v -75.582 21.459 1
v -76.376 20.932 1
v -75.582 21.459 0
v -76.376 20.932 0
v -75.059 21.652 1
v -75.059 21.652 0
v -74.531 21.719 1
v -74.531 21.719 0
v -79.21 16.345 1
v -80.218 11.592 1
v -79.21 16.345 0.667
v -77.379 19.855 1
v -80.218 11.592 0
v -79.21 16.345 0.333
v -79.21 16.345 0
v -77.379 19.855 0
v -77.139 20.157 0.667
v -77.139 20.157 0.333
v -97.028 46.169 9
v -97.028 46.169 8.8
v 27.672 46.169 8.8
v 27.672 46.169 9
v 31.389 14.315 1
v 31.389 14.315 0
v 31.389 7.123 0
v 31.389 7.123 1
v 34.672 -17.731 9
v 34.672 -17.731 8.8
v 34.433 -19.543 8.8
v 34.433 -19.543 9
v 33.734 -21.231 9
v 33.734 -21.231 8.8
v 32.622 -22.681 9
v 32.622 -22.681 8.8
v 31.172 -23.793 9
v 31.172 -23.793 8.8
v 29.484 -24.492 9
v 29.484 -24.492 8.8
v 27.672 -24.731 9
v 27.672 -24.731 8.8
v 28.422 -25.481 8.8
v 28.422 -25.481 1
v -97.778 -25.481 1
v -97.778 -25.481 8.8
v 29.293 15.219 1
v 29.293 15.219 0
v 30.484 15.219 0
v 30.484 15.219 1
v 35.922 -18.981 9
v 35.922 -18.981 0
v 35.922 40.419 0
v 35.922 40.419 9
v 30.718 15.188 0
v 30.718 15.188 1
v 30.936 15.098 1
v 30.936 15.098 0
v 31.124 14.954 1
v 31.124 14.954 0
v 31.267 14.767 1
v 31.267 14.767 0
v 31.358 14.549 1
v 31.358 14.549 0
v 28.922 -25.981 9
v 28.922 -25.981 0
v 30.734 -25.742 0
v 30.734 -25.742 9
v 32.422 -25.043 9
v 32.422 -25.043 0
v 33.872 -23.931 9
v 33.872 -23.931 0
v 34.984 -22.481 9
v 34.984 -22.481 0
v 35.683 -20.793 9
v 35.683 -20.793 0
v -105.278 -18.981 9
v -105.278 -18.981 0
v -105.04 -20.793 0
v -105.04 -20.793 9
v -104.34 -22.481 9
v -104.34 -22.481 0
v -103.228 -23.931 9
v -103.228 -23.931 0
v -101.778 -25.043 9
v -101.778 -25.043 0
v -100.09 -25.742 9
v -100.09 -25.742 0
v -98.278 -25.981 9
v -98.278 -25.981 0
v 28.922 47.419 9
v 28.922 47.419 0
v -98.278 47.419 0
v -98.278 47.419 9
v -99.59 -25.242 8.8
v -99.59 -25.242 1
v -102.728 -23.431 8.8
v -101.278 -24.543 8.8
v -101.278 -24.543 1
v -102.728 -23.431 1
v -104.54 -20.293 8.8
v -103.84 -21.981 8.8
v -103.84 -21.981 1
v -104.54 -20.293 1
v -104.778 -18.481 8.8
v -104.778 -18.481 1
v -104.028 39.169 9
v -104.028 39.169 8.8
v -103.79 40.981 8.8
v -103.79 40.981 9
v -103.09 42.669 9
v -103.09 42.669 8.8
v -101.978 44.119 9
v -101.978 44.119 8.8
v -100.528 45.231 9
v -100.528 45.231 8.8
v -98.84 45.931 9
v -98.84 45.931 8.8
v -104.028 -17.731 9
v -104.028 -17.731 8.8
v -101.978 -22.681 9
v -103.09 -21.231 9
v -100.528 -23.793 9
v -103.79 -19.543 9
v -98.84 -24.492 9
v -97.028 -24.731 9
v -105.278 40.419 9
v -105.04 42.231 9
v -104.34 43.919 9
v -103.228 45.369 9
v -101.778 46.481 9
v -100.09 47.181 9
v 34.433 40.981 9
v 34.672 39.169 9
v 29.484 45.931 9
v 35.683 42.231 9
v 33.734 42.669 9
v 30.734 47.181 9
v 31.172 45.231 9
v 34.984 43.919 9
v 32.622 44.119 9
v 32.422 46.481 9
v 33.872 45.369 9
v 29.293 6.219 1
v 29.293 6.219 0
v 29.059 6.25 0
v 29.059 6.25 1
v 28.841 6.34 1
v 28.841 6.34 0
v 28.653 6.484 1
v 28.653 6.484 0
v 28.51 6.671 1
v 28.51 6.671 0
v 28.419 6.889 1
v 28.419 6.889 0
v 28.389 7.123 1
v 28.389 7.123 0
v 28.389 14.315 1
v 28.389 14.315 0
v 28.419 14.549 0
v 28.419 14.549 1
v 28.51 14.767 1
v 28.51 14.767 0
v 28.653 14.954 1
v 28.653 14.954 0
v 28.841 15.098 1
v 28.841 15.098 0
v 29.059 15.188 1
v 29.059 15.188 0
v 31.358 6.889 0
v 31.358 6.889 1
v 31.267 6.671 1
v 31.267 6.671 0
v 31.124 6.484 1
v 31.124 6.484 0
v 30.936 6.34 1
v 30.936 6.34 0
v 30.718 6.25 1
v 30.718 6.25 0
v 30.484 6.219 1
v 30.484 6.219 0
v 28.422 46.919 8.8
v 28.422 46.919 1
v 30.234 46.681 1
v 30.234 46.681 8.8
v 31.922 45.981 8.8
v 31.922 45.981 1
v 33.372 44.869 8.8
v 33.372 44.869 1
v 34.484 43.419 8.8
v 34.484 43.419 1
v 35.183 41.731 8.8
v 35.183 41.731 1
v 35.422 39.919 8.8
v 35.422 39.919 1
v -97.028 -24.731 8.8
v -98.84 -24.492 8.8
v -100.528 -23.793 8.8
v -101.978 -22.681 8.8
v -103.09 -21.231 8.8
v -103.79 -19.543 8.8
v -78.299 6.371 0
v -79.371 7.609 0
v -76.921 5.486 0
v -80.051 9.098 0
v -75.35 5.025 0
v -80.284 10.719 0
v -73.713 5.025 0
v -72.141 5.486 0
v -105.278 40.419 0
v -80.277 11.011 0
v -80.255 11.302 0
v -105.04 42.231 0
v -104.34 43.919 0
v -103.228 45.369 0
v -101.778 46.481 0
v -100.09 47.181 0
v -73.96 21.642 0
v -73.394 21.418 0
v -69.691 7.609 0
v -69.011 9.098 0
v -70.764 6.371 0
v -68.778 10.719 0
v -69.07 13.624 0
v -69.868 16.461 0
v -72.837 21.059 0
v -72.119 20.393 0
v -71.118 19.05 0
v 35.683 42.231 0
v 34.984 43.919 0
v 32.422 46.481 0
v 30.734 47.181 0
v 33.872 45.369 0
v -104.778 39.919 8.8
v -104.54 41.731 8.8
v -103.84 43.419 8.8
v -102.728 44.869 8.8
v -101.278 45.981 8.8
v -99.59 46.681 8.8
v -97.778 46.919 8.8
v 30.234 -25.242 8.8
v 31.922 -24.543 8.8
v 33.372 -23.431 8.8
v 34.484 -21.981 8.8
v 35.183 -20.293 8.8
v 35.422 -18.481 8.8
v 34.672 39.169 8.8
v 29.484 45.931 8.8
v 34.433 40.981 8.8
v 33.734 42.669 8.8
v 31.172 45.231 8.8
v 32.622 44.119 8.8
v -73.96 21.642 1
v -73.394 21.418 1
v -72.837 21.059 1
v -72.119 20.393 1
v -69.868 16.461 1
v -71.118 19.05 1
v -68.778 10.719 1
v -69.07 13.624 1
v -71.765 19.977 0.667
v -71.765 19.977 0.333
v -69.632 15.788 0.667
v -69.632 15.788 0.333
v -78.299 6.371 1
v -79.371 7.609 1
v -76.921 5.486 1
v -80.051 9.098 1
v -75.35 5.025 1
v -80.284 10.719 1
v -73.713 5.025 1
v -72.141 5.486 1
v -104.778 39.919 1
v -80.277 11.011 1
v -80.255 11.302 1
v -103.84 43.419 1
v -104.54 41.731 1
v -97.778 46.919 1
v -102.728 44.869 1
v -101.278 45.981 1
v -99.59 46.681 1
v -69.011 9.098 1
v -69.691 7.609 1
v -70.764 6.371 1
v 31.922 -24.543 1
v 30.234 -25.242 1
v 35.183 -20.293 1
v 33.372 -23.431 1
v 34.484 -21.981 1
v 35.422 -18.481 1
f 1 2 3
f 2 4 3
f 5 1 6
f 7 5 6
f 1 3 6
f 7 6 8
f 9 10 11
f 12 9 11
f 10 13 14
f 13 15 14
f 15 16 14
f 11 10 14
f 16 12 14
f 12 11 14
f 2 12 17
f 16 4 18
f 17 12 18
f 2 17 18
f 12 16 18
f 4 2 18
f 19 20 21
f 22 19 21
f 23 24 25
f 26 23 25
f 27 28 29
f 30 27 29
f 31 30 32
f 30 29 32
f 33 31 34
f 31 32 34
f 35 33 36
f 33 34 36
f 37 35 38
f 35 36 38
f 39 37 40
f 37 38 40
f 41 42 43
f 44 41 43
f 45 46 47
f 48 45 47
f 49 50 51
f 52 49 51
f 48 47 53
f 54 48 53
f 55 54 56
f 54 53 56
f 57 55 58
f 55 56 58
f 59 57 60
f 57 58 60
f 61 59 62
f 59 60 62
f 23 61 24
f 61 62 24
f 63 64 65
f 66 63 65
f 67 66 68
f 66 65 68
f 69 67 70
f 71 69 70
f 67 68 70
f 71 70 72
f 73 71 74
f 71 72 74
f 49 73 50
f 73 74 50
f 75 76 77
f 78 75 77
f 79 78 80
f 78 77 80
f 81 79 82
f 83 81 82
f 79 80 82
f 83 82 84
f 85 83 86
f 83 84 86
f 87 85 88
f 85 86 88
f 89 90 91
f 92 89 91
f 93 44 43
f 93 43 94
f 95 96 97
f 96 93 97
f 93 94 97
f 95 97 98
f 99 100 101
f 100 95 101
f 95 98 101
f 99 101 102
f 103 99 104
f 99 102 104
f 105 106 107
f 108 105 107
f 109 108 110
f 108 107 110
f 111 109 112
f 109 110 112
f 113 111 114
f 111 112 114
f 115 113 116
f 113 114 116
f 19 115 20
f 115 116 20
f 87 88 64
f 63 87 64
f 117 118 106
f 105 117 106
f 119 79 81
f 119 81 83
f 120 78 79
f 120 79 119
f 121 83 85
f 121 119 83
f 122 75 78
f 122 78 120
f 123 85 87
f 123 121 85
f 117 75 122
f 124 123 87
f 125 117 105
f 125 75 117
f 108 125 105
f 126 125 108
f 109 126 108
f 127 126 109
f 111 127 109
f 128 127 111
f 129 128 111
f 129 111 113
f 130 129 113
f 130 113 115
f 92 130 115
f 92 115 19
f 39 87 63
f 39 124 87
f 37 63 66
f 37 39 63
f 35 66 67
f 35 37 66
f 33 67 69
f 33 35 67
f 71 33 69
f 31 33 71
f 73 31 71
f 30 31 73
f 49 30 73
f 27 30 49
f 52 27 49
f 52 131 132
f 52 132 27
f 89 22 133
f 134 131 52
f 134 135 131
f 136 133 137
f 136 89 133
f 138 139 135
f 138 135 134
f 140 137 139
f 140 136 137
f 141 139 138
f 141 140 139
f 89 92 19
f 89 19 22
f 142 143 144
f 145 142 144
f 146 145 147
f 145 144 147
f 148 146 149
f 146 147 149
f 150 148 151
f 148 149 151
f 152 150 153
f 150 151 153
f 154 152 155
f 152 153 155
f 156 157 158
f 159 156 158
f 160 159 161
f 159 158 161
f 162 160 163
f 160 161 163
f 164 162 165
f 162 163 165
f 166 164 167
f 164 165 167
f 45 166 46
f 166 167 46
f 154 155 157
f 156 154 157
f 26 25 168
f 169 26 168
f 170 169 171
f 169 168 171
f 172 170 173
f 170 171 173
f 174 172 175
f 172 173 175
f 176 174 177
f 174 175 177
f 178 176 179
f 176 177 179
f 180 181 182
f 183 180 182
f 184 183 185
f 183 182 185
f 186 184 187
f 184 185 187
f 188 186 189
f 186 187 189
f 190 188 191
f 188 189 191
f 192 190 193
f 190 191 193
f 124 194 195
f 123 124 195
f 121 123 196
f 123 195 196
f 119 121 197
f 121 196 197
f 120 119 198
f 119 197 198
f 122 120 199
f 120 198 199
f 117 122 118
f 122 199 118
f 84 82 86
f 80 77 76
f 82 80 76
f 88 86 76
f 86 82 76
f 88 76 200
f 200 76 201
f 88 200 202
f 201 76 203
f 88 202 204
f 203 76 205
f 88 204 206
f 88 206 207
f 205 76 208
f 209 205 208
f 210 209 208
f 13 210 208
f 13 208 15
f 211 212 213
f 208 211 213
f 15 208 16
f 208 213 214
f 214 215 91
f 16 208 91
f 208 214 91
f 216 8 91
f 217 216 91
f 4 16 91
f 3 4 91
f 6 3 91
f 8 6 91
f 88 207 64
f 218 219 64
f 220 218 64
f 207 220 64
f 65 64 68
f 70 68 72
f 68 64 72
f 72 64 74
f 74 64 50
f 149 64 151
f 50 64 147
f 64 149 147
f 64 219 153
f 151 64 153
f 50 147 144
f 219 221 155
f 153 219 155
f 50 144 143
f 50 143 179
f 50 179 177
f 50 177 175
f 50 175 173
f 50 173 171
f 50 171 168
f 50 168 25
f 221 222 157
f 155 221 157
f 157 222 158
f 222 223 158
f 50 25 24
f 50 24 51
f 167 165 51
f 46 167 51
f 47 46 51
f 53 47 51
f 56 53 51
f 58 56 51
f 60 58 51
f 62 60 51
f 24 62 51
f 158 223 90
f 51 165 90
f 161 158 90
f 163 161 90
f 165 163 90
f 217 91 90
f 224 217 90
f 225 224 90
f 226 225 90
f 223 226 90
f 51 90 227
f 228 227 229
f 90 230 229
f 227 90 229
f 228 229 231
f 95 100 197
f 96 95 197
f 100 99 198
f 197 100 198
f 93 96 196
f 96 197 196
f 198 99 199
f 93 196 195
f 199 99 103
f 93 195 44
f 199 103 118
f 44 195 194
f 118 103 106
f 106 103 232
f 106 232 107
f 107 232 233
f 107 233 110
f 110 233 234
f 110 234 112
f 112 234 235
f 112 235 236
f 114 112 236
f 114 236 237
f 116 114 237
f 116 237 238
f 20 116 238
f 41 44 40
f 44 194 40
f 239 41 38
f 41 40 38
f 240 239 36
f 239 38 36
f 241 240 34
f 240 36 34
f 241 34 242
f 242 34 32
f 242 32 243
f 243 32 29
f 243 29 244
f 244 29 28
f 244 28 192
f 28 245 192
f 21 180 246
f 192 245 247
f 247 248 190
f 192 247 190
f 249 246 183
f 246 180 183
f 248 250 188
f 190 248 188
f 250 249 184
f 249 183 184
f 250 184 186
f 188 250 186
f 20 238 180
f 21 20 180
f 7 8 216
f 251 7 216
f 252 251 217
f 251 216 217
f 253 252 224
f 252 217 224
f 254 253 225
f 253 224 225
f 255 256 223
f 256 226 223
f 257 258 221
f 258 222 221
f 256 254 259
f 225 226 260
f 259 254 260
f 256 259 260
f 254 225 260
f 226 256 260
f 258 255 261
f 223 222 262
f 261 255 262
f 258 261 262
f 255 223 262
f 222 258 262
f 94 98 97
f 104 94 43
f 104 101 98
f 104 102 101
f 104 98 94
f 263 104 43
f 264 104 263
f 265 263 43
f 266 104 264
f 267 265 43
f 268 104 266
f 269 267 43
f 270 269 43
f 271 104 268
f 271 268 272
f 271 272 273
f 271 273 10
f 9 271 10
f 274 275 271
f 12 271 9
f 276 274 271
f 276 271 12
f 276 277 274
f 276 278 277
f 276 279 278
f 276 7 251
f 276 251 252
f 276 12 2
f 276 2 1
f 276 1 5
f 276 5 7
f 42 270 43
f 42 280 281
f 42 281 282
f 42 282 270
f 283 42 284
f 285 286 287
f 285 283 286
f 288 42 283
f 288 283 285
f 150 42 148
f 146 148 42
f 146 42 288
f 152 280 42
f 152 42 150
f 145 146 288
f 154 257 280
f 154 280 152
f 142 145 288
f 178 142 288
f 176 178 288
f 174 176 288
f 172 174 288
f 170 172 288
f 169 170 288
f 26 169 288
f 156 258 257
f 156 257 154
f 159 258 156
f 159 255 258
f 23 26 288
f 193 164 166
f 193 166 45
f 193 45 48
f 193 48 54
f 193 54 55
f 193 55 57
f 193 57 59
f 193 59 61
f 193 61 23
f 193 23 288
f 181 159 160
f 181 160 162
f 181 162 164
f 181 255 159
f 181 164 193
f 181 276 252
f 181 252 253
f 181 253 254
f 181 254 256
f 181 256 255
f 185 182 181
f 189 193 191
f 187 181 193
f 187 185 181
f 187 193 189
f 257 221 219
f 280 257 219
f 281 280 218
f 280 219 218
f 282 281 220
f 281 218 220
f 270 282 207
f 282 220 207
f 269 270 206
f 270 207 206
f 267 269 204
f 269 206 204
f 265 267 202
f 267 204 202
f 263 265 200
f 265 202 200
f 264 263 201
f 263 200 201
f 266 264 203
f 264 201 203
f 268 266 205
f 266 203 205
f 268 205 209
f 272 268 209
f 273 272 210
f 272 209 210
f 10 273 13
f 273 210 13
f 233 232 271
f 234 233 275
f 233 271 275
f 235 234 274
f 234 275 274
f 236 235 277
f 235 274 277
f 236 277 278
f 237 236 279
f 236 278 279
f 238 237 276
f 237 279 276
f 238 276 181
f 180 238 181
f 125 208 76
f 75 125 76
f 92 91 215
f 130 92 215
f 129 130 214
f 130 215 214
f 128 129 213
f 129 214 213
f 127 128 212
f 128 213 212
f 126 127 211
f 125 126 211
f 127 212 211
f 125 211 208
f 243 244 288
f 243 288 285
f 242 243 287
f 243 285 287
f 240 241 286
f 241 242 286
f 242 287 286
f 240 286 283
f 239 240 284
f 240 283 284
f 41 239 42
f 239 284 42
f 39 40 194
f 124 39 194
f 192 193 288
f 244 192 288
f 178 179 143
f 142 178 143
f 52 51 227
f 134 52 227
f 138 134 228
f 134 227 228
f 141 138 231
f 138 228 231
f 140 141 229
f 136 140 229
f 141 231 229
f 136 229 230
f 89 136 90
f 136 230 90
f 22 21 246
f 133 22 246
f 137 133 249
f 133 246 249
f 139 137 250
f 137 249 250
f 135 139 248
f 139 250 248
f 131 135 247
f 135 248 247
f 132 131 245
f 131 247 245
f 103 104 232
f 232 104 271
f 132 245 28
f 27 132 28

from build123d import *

# Parameters (mm, degrees)
F1_DEPTH = 9
F2_DEPTH = 1
F3_START = 8.8
F3_DEPTH = 0.2


with BuildPart() as f1:
    # F0 (on Top) → F1 (new body)
    with BuildSketch(Plane.XY):
        with BuildLine():
            Line((28.9218353152, 47.4191074908), (-98.2781646848, 47.4191074908))
            ThreePointArc((-98.2781646848, 47.4191074908), (-103.2279121531, 45.3688549591), (-105.2781646848, 40.4191074908))
            Line((-105.2781646848, 40.4191074908), (-105.2781646848, -18.9808925092))
            ThreePointArc((-105.2781646848, -18.9808925092), (-103.2279121531, -23.9306399775), (-98.2781646848, -25.9808925092))
            Line((-98.2781646848, -25.9808925092), (28.9218353152, -25.9808925092))
            ThreePointArc((28.9218353152, -25.9808925092), (33.8715827835, -23.9306399775), (35.9218353152, -18.9808925092))
            Line((35.9218353152, -18.9808925092), (35.9218353152, 40.4191074908))
            ThreePointArc((35.9218353152, 40.4191074908), (33.8715827835, 45.3688549591), (28.9218353152, 47.4191074908))
        make_face()
        with BuildLine():
            ThreePointArc((-104.7781646848, 39.9191074908), (-102.7279121531, 44.8688549591), (-97.7781646848, 46.9191074908))
            Line((-97.7781646848, 46.9191074908), (28.4218353152, 46.9191074908))
            ThreePointArc((28.4218353152, 46.9191074908), (33.3715827835, 44.8688549591), (35.4218353152, 39.9191074908))
            Line((35.4218353152, 39.9191074908), (35.4218353152, -18.4808925092))
            ThreePointArc((35.4218353152, -18.4808925092), (33.3715827835, -23.4306399775), (28.4218353152, -25.4808925092))
            Line((28.4218353152, -25.4808925092), (-97.7781646848, -25.4808925092))
            ThreePointArc((-97.7781646848, -25.4808925092), (-102.7279121531, -23.4306399775), (-104.7781646848, -18.4808925092))
            Line((-104.7781646848, -18.4808925092), (-104.7781646848, 10.7191074908))
            Line((-104.7781646848, 10.7191074908), (-104.7781646848, 39.9191074908))
        make_face(mode=Mode.SUBTRACT)
    extrude(amount=F1_DEPTH)

    # F0 (on Top) → F2 (join)
    with BuildSketch(Plane.XY):
        with BuildLine():
            Line((28.9218353152, 47.4191074908), (-98.2781646848, 47.4191074908))
            ThreePointArc((-98.2781646848, 47.4191074908), (-103.2279121531, 45.3688549591), (-105.2781646848, 40.4191074908))
            Line((-105.2781646848, 40.4191074908), (-105.2781646848, -18.9808925092))
            ThreePointArc((-105.2781646848, -18.9808925092), (-103.2279121531, -23.9306399775), (-98.2781646848, -25.9808925092))
            Line((-98.2781646848, -25.9808925092), (28.9218353152, -25.9808925092))
            ThreePointArc((28.9218353152, -25.9808925092), (33.8715827835, -23.9306399775), (35.9218353152, -18.9808925092))
            Line((35.9218353152, -18.9808925092), (35.9218353152, 40.4191074908))
            ThreePointArc((35.9218353152, 40.4191074908), (33.8715827835, 45.3688549591), (28.9218353152, 47.4191074908))
        make_face()
        with BuildLine():
            ThreePointArc((-104.7781646848, 39.9191074908), (-102.7279121531, 44.8688549591), (-97.7781646848, 46.9191074908))
            Line((-97.7781646848, 46.9191074908), (28.4218353152, 46.9191074908))
            ThreePointArc((28.4218353152, 46.9191074908), (33.3715827835, 44.8688549591), (35.4218353152, 39.9191074908))
            Line((35.4218353152, 39.9191074908), (35.4218353152, -18.4808925092))
            ThreePointArc((35.4218353152, -18.4808925092), (33.3715827835, -23.4306399775), (28.4218353152, -25.4808925092))
            Line((28.4218353152, -25.4808925092), (-97.7781646848, -25.4808925092))
            ThreePointArc((-97.7781646848, -25.4808925092), (-102.7279121531, -23.4306399775), (-104.7781646848, -18.4808925092))
            Line((-104.7781646848, -18.4808925092), (-104.7781646848, 10.7191074908))
            Line((-104.7781646848, 10.7191074908), (-104.7781646848, 39.9191074908))
        make_face(mode=Mode.SUBTRACT)
        with BuildLine():
            Line((28.4218353152, 46.9191074908), (-97.7781646848, 46.9191074908))
            ThreePointArc((-97.7781646848, 46.9191074908), (-102.7279121531, 44.8688549591), (-104.7781646848, 39.9191074908))
            Line((-104.7781646848, 39.9191074908), (-104.7781646848, 10.7191074908))
            Line((-104.7781646848, 10.7191074908), (-104.7781646848, -18.4808925092))
            ThreePointArc((-104.7781646848, -18.4808925092), (-102.7279121531, -23.4306399775), (-97.7781646848, -25.4808925092))
            Line((-97.7781646848, -25.4808925092), (28.4218353152, -25.4808925092))
            ThreePointArc((28.4218353152, -25.4808925092), (33.3715827835, -23.4306399775), (35.4218353152, -18.4808925092))
            Line((35.4218353152, -18.4808925092), (35.4218353152, 39.9191074908))
            ThreePointArc((35.4218353152, 39.9191074908), (33.3715827835, 44.8688549591), (28.4218353152, 46.9191074908))
        make_face()
        with BuildLine():
            Line((-104.0281646848, -17.7308925092), (-104.0281646848, 10.7191074908))
            Line((-104.0281646848, 10.7191074908), (-104.0281646848, 39.1691074908))
            ThreePointArc((-104.0281646848, 39.1691074908), (-101.9779121531, 44.1188549591), (-97.0281646848, 46.1691074908))
            Line((-97.0281646848, 46.1691074908), (27.6718353152, 46.1691074908))
            ThreePointArc((27.6718353152, 46.1691074908), (32.6215827835, 44.1188549591), (34.6718353152, 39.1691074908))
            Line((34.6718353152, 39.1691074908), (34.6718353152, -17.7308925092))
            ThreePointArc((34.6718353152, -17.7308925092), (32.6215827835, -22.6806399775), (27.6718353152, -24.7308925092))
            Line((27.6718353152, -24.7308925092), (-97.0281646848, -24.7308925092))
            ThreePointArc((-97.0281646848, -24.7308925092), (-101.9779121531, -22.6806399775), (-104.0281646848, -17.7308925092))
        make_face(mode=Mode.SUBTRACT)
        with BuildLine():
            Line((-104.0281646848, 39.1691074908), (-104.0281646848, 10.7191074908))
            Line((-104.0281646848, 10.7191074908), (-104.0281646848, -17.7308925092))
            ThreePointArc((-104.0281646848, -17.7308925092), (-101.9779121531, -22.6806399775), (-97.0281646848, -24.7308925092))
            Line((-97.0281646848, -24.7308925092), (27.6718353152, -24.7308925092))
            ThreePointArc((27.6718353152, -24.7308925092), (32.6215827835, -22.6806399775), (34.6718353152, -17.7308925092))
            Line((34.6718353152, -17.7308925092), (34.6718353152, 39.1691074908))
            ThreePointArc((34.6718353152, 39.1691074908), (32.6215827835, 44.1188549591), (27.6718353152, 46.1691074908))
            Line((27.6718353152, 46.1691074908), (-97.0281646848, 46.1691074908))
            ThreePointArc((-97.0281646848, 46.1691074908), (-101.9779121531, 44.1188549591), (-104.0281646848, 39.1691074908))
        make_face()
        with BuildLine():
            ThreePointArc((-68.7781646848, 10.7191074908), (-74.5312646848, 4.9660074908), (-80.2843646848, 10.7191074908))
            ThreePointArc((-80.2843646848, 10.7191074908), (-80.2676868415, 11.1568522219), (-80.2177500076, 11.5920589691))
            add(Edge.make_bspline(
                [(-80.2177500076, 11.5920589691), (-79.9166287785, 16.380589161), (-77.2316050473, 21.7170679747), (-74.5312646848, 21.7191074908)],
                knots=[0.0288652727, 0.0288652727, 0.0288652727, 0.0288652727, 0.4998199399, 0.4998199399, 0.4998199399, 0.4998199399], degree=3))
            add(Edge.make_bspline(
                [(-74.5312646848, 21.7191074908), (-71.6633529752, 21.7212735703), (-68.7781646848, 15.7063938677), (-68.7781646848, 10.7191074908)],
                knots=[0.4998199399, 0.4998199399, 0.4998199399, 0.4998199399, 1, 1, 1, 1], degree=3))
        make_face(mode=Mode.SUBTRACT)
        with BuildLine():
            ThreePointArc((28.3885360956, 14.3148952636), (28.6533737253, 14.9542698611), (29.2927483228, 15.2191074908))
            Line((29.2927483228, 15.2191074908), (30.4843238684, 15.2191074908))
            ThreePointArc((30.4843238684, 15.2191074908), (31.1236984659, 14.9542698611), (31.3885360956, 14.3148952636))
            Line((31.3885360956, 14.3148952636), (31.3885360956, 7.1233197179))
            ThreePointArc((31.3885360956, 7.1233197179), (31.1236984659, 6.4839451205), (30.4843238684, 6.2191074908))
            Line((30.4843238684, 6.2191074908), (29.2927483228, 6.2191074908))
            ThreePointArc((29.2927483228, 6.2191074908), (28.6533737253, 6.4839451205), (28.3885360956, 7.1233197179))
            Line((28.3885360956, 7.1233197179), (28.3885360956, 14.3148952636))
        make_face(mode=Mode.SUBTRACT)
    extrude(amount=F2_DEPTH)

    # F0 (on Top) → F3 (join)
    with BuildSketch(Plane.XY.offset(F3_START)):
        with BuildLine():
            Line((28.4218353152, 46.9191074908), (-97.7781646848, 46.9191074908))
            ThreePointArc((-97.7781646848, 46.9191074908), (-102.7279121531, 44.8688549591), (-104.7781646848, 39.9191074908))
            Line((-104.7781646848, 39.9191074908), (-104.7781646848, 10.7191074908))
            Line((-104.7781646848, 10.7191074908), (-104.7781646848, -18.4808925092))
            ThreePointArc((-104.7781646848, -18.4808925092), (-102.7279121531, -23.4306399775), (-97.7781646848, -25.4808925092))
            Line((-97.7781646848, -25.4808925092), (28.4218353152, -25.4808925092))
            ThreePointArc((28.4218353152, -25.4808925092), (33.3715827835, -23.4306399775), (35.4218353152, -18.4808925092))
            Line((35.4218353152, -18.4808925092), (35.4218353152, 39.9191074908))
            ThreePointArc((35.4218353152, 39.9191074908), (33.3715827835, 44.8688549591), (28.4218353152, 46.9191074908))
        make_face()
        with BuildLine():
            Line((-104.0281646848, -17.7308925092), (-104.0281646848, 10.7191074908))
            Line((-104.0281646848, 10.7191074908), (-104.0281646848, 39.1691074908))
            ThreePointArc((-104.0281646848, 39.1691074908), (-101.9779121531, 44.1188549591), (-97.0281646848, 46.1691074908))
            Line((-97.0281646848, 46.1691074908), (27.6718353152, 46.1691074908))
            ThreePointArc((27.6718353152, 46.1691074908), (32.6215827835, 44.1188549591), (34.6718353152, 39.1691074908))
            Line((34.6718353152, 39.1691074908), (34.6718353152, -17.7308925092))
            ThreePointArc((34.6718353152, -17.7308925092), (32.6215827835, -22.6806399775), (27.6718353152, -24.7308925092))
            Line((27.6718353152, -24.7308925092), (-97.0281646848, -24.7308925092))
            ThreePointArc((-97.0281646848, -24.7308925092), (-101.9779121531, -22.6806399775), (-104.0281646848, -17.7308925092))
        make_face(mode=Mode.SUBTRACT)
    extrude(amount=F3_DEPTH)


solid = f1.part
